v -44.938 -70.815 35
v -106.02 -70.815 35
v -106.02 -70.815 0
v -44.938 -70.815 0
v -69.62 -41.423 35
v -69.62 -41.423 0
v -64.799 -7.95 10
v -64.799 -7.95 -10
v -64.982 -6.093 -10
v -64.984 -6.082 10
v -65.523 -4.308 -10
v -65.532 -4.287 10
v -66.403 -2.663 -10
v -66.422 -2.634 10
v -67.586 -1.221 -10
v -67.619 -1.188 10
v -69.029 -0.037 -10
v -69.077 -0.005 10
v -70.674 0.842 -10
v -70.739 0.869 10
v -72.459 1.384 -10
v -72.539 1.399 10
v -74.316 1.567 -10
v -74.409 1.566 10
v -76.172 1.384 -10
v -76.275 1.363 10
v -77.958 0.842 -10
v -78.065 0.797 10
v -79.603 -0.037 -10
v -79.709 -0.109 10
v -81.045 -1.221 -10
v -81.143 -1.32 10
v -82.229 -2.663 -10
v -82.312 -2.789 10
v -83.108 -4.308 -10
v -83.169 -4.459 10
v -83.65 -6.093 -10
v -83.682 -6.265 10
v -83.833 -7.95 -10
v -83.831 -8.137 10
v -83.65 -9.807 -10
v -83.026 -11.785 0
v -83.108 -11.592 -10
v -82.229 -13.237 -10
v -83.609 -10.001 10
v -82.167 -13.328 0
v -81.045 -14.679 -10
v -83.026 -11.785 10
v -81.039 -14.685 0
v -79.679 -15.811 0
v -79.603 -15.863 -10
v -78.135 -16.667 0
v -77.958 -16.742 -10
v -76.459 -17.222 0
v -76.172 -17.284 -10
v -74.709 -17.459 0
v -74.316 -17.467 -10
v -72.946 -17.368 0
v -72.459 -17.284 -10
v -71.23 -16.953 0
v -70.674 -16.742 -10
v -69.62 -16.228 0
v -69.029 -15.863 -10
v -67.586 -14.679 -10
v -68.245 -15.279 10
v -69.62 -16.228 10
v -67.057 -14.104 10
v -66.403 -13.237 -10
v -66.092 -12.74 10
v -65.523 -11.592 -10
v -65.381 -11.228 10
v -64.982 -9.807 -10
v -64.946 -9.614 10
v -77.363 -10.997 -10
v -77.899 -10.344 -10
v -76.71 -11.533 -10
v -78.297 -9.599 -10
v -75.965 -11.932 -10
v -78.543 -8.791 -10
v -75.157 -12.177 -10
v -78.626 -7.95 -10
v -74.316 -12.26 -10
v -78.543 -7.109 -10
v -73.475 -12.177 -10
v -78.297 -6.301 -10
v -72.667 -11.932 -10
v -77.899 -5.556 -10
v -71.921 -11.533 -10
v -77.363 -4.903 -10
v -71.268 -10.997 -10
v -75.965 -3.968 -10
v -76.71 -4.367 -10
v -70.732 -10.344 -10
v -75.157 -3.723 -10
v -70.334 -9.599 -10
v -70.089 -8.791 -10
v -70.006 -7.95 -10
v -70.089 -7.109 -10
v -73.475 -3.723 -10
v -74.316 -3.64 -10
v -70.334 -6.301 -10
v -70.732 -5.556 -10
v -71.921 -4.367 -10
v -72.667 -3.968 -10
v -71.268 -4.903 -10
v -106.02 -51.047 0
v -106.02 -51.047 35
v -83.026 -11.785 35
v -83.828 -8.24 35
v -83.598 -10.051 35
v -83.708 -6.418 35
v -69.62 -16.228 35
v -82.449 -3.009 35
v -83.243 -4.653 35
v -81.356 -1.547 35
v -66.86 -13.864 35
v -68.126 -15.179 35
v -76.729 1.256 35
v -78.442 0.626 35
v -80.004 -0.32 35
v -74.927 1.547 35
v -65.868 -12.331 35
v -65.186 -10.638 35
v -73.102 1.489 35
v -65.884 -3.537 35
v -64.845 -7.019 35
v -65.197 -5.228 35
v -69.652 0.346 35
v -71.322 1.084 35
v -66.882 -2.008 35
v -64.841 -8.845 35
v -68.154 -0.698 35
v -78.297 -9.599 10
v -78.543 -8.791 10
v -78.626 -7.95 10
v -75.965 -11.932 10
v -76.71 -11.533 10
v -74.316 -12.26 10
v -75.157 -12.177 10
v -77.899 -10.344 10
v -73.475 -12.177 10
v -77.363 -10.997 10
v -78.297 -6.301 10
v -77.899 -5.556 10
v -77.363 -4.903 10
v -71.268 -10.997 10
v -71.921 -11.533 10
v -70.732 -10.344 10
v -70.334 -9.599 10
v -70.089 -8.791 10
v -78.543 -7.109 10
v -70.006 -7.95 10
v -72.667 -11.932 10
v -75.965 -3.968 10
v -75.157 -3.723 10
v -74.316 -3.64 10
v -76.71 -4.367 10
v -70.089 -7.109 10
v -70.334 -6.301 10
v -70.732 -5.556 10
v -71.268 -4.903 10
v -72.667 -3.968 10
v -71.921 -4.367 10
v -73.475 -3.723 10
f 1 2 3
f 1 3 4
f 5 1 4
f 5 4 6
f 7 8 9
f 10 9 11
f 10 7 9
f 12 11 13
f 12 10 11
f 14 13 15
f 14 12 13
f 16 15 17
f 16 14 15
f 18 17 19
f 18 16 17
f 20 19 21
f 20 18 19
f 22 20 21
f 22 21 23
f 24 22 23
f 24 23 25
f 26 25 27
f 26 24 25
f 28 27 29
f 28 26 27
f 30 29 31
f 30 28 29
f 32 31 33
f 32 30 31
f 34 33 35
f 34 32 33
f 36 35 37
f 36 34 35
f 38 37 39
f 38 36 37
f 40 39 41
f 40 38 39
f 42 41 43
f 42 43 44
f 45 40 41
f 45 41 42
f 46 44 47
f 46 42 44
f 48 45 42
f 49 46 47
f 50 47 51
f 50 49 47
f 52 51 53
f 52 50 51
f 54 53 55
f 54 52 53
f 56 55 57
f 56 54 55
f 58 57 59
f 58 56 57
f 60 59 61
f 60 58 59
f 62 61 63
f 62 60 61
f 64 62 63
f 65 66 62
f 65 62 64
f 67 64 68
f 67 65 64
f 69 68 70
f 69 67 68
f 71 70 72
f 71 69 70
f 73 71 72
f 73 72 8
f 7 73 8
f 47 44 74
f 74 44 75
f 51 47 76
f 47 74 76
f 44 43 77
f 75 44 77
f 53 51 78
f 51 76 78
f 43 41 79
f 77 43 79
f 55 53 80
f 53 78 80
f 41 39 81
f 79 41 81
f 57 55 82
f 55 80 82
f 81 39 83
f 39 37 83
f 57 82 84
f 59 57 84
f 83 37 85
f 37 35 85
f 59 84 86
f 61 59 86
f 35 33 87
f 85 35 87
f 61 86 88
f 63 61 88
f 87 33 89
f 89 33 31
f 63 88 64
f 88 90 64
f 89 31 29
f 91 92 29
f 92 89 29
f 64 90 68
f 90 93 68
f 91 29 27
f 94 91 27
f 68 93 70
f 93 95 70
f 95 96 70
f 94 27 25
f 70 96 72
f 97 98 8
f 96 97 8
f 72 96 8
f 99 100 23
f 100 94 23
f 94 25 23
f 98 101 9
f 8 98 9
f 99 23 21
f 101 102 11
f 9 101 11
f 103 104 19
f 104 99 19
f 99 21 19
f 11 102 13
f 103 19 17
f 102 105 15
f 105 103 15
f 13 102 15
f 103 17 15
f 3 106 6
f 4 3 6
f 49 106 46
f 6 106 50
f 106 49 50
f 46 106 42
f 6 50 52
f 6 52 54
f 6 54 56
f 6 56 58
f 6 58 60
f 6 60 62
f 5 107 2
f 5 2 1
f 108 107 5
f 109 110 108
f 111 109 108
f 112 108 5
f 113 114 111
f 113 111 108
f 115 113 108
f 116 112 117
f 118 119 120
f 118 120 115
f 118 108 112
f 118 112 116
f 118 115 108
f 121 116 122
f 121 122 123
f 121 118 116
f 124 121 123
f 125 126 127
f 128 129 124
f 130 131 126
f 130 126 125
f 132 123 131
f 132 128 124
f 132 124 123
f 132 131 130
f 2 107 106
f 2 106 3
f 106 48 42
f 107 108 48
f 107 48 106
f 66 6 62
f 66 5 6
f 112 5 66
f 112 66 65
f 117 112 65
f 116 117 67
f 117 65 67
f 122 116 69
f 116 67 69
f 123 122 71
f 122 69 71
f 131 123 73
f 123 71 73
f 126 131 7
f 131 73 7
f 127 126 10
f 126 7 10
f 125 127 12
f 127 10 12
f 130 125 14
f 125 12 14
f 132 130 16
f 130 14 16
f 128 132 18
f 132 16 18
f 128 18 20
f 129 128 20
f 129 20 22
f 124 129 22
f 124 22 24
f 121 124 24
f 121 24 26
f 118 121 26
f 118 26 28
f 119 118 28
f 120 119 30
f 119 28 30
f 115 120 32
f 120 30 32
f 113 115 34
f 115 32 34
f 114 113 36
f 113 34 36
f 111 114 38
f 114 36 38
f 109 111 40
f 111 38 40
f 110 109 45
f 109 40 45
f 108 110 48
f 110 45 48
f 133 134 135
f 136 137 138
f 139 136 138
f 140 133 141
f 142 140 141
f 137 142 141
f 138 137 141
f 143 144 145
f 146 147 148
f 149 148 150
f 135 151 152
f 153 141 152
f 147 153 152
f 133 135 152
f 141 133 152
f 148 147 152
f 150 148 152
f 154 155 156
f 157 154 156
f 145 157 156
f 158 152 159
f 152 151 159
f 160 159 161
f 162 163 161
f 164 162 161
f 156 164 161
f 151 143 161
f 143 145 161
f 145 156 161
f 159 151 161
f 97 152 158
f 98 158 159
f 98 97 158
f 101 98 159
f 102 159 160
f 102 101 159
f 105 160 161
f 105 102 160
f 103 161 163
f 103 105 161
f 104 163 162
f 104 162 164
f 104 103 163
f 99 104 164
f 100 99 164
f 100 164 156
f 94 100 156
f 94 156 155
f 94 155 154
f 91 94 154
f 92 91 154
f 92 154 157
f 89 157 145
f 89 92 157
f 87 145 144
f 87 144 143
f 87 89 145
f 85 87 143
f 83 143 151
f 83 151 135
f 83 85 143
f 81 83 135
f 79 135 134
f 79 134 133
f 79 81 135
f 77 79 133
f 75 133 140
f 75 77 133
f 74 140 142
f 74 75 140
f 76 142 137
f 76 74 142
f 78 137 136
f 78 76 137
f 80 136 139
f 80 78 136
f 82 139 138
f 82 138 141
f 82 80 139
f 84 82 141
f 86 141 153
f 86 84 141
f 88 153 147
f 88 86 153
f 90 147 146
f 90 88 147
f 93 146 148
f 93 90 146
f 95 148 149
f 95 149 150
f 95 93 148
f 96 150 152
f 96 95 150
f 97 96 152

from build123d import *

# Parameters (mm, degrees)
SKETCH1_R           = 9.516746653
SKETCH1_R_2         = 4.309736146
EXTRUDE1_DEPTH      = 10
EXTRUDE1_DEPTH_BACK = 10
EXTRUDE2_DEPTH      = 25
EXTRUDE2_DEPTH_BACK = 10
EXTRUDE3_DEPTH      = 25


with BuildPart() as part:
    # Sketch1 → Extrude1 (new body, two sides)
    with BuildSketch(Plane.XY) as extrude1_sk:
        with Locations((-74.315769624, -7.949999587)):
            Circle(SKETCH1_R)
        with Locations((-74.315769624, -7.949999587)):
            Circle(SKETCH1_R_2, mode=Mode.SUBTRACT)
    extrude(amount=EXTRUDE1_DEPTH)
    extrude(extrude1_sk.sketch, amount=-EXTRUDE1_DEPTH_BACK)

    # Sketch2 → Extrude2 (add, two sides)
    with BuildSketch(Plane.XY.offset(10)) as extrude2_sk:
        with BuildLine():
            Line((-83.025654753, -11.784887838), (-106.019653855, -51.047339529))
            Line((-106.019653855, -51.047339529), (-106.019653855, -70.815363126))
            Line((-106.019653855, -70.815363126), (-44.938455036, -70.815363126))
            Line((-44.938455036, -70.815363126), (-69.620440041, -41.423398152))
            Line((-69.620440041, -41.423398152), (-69.620440041, -16.227822185))
            ThreePointArc((-69.620440041, -16.227822185), (-77.309777049, -16.983514208), (-83.025654753, -11.784887838))
        make_face()
    extrude(amount=EXTRUDE2_DEPTH)
    extrude(extrude2_sk.sketch, amount=-EXTRUDE2_DEPTH_BACK)

    # Sketch3 → Extrude3 (add)
    with BuildSketch(Plane.XY.offset(10)):
        with BuildLine():
            ThreePointArc((-83.025654753, -11.784887838), (-77.309777049, -16.983514208), (-69.620440041, -16.227822185))
            ThreePointArc((-69.620440041, -16.227822185), (-71.321762199, 1.083515033), (-83.025654753, -11.784887838))
        make_face()
    extrude(amount=EXTRUDE3_DEPTH)


solid = part.part
